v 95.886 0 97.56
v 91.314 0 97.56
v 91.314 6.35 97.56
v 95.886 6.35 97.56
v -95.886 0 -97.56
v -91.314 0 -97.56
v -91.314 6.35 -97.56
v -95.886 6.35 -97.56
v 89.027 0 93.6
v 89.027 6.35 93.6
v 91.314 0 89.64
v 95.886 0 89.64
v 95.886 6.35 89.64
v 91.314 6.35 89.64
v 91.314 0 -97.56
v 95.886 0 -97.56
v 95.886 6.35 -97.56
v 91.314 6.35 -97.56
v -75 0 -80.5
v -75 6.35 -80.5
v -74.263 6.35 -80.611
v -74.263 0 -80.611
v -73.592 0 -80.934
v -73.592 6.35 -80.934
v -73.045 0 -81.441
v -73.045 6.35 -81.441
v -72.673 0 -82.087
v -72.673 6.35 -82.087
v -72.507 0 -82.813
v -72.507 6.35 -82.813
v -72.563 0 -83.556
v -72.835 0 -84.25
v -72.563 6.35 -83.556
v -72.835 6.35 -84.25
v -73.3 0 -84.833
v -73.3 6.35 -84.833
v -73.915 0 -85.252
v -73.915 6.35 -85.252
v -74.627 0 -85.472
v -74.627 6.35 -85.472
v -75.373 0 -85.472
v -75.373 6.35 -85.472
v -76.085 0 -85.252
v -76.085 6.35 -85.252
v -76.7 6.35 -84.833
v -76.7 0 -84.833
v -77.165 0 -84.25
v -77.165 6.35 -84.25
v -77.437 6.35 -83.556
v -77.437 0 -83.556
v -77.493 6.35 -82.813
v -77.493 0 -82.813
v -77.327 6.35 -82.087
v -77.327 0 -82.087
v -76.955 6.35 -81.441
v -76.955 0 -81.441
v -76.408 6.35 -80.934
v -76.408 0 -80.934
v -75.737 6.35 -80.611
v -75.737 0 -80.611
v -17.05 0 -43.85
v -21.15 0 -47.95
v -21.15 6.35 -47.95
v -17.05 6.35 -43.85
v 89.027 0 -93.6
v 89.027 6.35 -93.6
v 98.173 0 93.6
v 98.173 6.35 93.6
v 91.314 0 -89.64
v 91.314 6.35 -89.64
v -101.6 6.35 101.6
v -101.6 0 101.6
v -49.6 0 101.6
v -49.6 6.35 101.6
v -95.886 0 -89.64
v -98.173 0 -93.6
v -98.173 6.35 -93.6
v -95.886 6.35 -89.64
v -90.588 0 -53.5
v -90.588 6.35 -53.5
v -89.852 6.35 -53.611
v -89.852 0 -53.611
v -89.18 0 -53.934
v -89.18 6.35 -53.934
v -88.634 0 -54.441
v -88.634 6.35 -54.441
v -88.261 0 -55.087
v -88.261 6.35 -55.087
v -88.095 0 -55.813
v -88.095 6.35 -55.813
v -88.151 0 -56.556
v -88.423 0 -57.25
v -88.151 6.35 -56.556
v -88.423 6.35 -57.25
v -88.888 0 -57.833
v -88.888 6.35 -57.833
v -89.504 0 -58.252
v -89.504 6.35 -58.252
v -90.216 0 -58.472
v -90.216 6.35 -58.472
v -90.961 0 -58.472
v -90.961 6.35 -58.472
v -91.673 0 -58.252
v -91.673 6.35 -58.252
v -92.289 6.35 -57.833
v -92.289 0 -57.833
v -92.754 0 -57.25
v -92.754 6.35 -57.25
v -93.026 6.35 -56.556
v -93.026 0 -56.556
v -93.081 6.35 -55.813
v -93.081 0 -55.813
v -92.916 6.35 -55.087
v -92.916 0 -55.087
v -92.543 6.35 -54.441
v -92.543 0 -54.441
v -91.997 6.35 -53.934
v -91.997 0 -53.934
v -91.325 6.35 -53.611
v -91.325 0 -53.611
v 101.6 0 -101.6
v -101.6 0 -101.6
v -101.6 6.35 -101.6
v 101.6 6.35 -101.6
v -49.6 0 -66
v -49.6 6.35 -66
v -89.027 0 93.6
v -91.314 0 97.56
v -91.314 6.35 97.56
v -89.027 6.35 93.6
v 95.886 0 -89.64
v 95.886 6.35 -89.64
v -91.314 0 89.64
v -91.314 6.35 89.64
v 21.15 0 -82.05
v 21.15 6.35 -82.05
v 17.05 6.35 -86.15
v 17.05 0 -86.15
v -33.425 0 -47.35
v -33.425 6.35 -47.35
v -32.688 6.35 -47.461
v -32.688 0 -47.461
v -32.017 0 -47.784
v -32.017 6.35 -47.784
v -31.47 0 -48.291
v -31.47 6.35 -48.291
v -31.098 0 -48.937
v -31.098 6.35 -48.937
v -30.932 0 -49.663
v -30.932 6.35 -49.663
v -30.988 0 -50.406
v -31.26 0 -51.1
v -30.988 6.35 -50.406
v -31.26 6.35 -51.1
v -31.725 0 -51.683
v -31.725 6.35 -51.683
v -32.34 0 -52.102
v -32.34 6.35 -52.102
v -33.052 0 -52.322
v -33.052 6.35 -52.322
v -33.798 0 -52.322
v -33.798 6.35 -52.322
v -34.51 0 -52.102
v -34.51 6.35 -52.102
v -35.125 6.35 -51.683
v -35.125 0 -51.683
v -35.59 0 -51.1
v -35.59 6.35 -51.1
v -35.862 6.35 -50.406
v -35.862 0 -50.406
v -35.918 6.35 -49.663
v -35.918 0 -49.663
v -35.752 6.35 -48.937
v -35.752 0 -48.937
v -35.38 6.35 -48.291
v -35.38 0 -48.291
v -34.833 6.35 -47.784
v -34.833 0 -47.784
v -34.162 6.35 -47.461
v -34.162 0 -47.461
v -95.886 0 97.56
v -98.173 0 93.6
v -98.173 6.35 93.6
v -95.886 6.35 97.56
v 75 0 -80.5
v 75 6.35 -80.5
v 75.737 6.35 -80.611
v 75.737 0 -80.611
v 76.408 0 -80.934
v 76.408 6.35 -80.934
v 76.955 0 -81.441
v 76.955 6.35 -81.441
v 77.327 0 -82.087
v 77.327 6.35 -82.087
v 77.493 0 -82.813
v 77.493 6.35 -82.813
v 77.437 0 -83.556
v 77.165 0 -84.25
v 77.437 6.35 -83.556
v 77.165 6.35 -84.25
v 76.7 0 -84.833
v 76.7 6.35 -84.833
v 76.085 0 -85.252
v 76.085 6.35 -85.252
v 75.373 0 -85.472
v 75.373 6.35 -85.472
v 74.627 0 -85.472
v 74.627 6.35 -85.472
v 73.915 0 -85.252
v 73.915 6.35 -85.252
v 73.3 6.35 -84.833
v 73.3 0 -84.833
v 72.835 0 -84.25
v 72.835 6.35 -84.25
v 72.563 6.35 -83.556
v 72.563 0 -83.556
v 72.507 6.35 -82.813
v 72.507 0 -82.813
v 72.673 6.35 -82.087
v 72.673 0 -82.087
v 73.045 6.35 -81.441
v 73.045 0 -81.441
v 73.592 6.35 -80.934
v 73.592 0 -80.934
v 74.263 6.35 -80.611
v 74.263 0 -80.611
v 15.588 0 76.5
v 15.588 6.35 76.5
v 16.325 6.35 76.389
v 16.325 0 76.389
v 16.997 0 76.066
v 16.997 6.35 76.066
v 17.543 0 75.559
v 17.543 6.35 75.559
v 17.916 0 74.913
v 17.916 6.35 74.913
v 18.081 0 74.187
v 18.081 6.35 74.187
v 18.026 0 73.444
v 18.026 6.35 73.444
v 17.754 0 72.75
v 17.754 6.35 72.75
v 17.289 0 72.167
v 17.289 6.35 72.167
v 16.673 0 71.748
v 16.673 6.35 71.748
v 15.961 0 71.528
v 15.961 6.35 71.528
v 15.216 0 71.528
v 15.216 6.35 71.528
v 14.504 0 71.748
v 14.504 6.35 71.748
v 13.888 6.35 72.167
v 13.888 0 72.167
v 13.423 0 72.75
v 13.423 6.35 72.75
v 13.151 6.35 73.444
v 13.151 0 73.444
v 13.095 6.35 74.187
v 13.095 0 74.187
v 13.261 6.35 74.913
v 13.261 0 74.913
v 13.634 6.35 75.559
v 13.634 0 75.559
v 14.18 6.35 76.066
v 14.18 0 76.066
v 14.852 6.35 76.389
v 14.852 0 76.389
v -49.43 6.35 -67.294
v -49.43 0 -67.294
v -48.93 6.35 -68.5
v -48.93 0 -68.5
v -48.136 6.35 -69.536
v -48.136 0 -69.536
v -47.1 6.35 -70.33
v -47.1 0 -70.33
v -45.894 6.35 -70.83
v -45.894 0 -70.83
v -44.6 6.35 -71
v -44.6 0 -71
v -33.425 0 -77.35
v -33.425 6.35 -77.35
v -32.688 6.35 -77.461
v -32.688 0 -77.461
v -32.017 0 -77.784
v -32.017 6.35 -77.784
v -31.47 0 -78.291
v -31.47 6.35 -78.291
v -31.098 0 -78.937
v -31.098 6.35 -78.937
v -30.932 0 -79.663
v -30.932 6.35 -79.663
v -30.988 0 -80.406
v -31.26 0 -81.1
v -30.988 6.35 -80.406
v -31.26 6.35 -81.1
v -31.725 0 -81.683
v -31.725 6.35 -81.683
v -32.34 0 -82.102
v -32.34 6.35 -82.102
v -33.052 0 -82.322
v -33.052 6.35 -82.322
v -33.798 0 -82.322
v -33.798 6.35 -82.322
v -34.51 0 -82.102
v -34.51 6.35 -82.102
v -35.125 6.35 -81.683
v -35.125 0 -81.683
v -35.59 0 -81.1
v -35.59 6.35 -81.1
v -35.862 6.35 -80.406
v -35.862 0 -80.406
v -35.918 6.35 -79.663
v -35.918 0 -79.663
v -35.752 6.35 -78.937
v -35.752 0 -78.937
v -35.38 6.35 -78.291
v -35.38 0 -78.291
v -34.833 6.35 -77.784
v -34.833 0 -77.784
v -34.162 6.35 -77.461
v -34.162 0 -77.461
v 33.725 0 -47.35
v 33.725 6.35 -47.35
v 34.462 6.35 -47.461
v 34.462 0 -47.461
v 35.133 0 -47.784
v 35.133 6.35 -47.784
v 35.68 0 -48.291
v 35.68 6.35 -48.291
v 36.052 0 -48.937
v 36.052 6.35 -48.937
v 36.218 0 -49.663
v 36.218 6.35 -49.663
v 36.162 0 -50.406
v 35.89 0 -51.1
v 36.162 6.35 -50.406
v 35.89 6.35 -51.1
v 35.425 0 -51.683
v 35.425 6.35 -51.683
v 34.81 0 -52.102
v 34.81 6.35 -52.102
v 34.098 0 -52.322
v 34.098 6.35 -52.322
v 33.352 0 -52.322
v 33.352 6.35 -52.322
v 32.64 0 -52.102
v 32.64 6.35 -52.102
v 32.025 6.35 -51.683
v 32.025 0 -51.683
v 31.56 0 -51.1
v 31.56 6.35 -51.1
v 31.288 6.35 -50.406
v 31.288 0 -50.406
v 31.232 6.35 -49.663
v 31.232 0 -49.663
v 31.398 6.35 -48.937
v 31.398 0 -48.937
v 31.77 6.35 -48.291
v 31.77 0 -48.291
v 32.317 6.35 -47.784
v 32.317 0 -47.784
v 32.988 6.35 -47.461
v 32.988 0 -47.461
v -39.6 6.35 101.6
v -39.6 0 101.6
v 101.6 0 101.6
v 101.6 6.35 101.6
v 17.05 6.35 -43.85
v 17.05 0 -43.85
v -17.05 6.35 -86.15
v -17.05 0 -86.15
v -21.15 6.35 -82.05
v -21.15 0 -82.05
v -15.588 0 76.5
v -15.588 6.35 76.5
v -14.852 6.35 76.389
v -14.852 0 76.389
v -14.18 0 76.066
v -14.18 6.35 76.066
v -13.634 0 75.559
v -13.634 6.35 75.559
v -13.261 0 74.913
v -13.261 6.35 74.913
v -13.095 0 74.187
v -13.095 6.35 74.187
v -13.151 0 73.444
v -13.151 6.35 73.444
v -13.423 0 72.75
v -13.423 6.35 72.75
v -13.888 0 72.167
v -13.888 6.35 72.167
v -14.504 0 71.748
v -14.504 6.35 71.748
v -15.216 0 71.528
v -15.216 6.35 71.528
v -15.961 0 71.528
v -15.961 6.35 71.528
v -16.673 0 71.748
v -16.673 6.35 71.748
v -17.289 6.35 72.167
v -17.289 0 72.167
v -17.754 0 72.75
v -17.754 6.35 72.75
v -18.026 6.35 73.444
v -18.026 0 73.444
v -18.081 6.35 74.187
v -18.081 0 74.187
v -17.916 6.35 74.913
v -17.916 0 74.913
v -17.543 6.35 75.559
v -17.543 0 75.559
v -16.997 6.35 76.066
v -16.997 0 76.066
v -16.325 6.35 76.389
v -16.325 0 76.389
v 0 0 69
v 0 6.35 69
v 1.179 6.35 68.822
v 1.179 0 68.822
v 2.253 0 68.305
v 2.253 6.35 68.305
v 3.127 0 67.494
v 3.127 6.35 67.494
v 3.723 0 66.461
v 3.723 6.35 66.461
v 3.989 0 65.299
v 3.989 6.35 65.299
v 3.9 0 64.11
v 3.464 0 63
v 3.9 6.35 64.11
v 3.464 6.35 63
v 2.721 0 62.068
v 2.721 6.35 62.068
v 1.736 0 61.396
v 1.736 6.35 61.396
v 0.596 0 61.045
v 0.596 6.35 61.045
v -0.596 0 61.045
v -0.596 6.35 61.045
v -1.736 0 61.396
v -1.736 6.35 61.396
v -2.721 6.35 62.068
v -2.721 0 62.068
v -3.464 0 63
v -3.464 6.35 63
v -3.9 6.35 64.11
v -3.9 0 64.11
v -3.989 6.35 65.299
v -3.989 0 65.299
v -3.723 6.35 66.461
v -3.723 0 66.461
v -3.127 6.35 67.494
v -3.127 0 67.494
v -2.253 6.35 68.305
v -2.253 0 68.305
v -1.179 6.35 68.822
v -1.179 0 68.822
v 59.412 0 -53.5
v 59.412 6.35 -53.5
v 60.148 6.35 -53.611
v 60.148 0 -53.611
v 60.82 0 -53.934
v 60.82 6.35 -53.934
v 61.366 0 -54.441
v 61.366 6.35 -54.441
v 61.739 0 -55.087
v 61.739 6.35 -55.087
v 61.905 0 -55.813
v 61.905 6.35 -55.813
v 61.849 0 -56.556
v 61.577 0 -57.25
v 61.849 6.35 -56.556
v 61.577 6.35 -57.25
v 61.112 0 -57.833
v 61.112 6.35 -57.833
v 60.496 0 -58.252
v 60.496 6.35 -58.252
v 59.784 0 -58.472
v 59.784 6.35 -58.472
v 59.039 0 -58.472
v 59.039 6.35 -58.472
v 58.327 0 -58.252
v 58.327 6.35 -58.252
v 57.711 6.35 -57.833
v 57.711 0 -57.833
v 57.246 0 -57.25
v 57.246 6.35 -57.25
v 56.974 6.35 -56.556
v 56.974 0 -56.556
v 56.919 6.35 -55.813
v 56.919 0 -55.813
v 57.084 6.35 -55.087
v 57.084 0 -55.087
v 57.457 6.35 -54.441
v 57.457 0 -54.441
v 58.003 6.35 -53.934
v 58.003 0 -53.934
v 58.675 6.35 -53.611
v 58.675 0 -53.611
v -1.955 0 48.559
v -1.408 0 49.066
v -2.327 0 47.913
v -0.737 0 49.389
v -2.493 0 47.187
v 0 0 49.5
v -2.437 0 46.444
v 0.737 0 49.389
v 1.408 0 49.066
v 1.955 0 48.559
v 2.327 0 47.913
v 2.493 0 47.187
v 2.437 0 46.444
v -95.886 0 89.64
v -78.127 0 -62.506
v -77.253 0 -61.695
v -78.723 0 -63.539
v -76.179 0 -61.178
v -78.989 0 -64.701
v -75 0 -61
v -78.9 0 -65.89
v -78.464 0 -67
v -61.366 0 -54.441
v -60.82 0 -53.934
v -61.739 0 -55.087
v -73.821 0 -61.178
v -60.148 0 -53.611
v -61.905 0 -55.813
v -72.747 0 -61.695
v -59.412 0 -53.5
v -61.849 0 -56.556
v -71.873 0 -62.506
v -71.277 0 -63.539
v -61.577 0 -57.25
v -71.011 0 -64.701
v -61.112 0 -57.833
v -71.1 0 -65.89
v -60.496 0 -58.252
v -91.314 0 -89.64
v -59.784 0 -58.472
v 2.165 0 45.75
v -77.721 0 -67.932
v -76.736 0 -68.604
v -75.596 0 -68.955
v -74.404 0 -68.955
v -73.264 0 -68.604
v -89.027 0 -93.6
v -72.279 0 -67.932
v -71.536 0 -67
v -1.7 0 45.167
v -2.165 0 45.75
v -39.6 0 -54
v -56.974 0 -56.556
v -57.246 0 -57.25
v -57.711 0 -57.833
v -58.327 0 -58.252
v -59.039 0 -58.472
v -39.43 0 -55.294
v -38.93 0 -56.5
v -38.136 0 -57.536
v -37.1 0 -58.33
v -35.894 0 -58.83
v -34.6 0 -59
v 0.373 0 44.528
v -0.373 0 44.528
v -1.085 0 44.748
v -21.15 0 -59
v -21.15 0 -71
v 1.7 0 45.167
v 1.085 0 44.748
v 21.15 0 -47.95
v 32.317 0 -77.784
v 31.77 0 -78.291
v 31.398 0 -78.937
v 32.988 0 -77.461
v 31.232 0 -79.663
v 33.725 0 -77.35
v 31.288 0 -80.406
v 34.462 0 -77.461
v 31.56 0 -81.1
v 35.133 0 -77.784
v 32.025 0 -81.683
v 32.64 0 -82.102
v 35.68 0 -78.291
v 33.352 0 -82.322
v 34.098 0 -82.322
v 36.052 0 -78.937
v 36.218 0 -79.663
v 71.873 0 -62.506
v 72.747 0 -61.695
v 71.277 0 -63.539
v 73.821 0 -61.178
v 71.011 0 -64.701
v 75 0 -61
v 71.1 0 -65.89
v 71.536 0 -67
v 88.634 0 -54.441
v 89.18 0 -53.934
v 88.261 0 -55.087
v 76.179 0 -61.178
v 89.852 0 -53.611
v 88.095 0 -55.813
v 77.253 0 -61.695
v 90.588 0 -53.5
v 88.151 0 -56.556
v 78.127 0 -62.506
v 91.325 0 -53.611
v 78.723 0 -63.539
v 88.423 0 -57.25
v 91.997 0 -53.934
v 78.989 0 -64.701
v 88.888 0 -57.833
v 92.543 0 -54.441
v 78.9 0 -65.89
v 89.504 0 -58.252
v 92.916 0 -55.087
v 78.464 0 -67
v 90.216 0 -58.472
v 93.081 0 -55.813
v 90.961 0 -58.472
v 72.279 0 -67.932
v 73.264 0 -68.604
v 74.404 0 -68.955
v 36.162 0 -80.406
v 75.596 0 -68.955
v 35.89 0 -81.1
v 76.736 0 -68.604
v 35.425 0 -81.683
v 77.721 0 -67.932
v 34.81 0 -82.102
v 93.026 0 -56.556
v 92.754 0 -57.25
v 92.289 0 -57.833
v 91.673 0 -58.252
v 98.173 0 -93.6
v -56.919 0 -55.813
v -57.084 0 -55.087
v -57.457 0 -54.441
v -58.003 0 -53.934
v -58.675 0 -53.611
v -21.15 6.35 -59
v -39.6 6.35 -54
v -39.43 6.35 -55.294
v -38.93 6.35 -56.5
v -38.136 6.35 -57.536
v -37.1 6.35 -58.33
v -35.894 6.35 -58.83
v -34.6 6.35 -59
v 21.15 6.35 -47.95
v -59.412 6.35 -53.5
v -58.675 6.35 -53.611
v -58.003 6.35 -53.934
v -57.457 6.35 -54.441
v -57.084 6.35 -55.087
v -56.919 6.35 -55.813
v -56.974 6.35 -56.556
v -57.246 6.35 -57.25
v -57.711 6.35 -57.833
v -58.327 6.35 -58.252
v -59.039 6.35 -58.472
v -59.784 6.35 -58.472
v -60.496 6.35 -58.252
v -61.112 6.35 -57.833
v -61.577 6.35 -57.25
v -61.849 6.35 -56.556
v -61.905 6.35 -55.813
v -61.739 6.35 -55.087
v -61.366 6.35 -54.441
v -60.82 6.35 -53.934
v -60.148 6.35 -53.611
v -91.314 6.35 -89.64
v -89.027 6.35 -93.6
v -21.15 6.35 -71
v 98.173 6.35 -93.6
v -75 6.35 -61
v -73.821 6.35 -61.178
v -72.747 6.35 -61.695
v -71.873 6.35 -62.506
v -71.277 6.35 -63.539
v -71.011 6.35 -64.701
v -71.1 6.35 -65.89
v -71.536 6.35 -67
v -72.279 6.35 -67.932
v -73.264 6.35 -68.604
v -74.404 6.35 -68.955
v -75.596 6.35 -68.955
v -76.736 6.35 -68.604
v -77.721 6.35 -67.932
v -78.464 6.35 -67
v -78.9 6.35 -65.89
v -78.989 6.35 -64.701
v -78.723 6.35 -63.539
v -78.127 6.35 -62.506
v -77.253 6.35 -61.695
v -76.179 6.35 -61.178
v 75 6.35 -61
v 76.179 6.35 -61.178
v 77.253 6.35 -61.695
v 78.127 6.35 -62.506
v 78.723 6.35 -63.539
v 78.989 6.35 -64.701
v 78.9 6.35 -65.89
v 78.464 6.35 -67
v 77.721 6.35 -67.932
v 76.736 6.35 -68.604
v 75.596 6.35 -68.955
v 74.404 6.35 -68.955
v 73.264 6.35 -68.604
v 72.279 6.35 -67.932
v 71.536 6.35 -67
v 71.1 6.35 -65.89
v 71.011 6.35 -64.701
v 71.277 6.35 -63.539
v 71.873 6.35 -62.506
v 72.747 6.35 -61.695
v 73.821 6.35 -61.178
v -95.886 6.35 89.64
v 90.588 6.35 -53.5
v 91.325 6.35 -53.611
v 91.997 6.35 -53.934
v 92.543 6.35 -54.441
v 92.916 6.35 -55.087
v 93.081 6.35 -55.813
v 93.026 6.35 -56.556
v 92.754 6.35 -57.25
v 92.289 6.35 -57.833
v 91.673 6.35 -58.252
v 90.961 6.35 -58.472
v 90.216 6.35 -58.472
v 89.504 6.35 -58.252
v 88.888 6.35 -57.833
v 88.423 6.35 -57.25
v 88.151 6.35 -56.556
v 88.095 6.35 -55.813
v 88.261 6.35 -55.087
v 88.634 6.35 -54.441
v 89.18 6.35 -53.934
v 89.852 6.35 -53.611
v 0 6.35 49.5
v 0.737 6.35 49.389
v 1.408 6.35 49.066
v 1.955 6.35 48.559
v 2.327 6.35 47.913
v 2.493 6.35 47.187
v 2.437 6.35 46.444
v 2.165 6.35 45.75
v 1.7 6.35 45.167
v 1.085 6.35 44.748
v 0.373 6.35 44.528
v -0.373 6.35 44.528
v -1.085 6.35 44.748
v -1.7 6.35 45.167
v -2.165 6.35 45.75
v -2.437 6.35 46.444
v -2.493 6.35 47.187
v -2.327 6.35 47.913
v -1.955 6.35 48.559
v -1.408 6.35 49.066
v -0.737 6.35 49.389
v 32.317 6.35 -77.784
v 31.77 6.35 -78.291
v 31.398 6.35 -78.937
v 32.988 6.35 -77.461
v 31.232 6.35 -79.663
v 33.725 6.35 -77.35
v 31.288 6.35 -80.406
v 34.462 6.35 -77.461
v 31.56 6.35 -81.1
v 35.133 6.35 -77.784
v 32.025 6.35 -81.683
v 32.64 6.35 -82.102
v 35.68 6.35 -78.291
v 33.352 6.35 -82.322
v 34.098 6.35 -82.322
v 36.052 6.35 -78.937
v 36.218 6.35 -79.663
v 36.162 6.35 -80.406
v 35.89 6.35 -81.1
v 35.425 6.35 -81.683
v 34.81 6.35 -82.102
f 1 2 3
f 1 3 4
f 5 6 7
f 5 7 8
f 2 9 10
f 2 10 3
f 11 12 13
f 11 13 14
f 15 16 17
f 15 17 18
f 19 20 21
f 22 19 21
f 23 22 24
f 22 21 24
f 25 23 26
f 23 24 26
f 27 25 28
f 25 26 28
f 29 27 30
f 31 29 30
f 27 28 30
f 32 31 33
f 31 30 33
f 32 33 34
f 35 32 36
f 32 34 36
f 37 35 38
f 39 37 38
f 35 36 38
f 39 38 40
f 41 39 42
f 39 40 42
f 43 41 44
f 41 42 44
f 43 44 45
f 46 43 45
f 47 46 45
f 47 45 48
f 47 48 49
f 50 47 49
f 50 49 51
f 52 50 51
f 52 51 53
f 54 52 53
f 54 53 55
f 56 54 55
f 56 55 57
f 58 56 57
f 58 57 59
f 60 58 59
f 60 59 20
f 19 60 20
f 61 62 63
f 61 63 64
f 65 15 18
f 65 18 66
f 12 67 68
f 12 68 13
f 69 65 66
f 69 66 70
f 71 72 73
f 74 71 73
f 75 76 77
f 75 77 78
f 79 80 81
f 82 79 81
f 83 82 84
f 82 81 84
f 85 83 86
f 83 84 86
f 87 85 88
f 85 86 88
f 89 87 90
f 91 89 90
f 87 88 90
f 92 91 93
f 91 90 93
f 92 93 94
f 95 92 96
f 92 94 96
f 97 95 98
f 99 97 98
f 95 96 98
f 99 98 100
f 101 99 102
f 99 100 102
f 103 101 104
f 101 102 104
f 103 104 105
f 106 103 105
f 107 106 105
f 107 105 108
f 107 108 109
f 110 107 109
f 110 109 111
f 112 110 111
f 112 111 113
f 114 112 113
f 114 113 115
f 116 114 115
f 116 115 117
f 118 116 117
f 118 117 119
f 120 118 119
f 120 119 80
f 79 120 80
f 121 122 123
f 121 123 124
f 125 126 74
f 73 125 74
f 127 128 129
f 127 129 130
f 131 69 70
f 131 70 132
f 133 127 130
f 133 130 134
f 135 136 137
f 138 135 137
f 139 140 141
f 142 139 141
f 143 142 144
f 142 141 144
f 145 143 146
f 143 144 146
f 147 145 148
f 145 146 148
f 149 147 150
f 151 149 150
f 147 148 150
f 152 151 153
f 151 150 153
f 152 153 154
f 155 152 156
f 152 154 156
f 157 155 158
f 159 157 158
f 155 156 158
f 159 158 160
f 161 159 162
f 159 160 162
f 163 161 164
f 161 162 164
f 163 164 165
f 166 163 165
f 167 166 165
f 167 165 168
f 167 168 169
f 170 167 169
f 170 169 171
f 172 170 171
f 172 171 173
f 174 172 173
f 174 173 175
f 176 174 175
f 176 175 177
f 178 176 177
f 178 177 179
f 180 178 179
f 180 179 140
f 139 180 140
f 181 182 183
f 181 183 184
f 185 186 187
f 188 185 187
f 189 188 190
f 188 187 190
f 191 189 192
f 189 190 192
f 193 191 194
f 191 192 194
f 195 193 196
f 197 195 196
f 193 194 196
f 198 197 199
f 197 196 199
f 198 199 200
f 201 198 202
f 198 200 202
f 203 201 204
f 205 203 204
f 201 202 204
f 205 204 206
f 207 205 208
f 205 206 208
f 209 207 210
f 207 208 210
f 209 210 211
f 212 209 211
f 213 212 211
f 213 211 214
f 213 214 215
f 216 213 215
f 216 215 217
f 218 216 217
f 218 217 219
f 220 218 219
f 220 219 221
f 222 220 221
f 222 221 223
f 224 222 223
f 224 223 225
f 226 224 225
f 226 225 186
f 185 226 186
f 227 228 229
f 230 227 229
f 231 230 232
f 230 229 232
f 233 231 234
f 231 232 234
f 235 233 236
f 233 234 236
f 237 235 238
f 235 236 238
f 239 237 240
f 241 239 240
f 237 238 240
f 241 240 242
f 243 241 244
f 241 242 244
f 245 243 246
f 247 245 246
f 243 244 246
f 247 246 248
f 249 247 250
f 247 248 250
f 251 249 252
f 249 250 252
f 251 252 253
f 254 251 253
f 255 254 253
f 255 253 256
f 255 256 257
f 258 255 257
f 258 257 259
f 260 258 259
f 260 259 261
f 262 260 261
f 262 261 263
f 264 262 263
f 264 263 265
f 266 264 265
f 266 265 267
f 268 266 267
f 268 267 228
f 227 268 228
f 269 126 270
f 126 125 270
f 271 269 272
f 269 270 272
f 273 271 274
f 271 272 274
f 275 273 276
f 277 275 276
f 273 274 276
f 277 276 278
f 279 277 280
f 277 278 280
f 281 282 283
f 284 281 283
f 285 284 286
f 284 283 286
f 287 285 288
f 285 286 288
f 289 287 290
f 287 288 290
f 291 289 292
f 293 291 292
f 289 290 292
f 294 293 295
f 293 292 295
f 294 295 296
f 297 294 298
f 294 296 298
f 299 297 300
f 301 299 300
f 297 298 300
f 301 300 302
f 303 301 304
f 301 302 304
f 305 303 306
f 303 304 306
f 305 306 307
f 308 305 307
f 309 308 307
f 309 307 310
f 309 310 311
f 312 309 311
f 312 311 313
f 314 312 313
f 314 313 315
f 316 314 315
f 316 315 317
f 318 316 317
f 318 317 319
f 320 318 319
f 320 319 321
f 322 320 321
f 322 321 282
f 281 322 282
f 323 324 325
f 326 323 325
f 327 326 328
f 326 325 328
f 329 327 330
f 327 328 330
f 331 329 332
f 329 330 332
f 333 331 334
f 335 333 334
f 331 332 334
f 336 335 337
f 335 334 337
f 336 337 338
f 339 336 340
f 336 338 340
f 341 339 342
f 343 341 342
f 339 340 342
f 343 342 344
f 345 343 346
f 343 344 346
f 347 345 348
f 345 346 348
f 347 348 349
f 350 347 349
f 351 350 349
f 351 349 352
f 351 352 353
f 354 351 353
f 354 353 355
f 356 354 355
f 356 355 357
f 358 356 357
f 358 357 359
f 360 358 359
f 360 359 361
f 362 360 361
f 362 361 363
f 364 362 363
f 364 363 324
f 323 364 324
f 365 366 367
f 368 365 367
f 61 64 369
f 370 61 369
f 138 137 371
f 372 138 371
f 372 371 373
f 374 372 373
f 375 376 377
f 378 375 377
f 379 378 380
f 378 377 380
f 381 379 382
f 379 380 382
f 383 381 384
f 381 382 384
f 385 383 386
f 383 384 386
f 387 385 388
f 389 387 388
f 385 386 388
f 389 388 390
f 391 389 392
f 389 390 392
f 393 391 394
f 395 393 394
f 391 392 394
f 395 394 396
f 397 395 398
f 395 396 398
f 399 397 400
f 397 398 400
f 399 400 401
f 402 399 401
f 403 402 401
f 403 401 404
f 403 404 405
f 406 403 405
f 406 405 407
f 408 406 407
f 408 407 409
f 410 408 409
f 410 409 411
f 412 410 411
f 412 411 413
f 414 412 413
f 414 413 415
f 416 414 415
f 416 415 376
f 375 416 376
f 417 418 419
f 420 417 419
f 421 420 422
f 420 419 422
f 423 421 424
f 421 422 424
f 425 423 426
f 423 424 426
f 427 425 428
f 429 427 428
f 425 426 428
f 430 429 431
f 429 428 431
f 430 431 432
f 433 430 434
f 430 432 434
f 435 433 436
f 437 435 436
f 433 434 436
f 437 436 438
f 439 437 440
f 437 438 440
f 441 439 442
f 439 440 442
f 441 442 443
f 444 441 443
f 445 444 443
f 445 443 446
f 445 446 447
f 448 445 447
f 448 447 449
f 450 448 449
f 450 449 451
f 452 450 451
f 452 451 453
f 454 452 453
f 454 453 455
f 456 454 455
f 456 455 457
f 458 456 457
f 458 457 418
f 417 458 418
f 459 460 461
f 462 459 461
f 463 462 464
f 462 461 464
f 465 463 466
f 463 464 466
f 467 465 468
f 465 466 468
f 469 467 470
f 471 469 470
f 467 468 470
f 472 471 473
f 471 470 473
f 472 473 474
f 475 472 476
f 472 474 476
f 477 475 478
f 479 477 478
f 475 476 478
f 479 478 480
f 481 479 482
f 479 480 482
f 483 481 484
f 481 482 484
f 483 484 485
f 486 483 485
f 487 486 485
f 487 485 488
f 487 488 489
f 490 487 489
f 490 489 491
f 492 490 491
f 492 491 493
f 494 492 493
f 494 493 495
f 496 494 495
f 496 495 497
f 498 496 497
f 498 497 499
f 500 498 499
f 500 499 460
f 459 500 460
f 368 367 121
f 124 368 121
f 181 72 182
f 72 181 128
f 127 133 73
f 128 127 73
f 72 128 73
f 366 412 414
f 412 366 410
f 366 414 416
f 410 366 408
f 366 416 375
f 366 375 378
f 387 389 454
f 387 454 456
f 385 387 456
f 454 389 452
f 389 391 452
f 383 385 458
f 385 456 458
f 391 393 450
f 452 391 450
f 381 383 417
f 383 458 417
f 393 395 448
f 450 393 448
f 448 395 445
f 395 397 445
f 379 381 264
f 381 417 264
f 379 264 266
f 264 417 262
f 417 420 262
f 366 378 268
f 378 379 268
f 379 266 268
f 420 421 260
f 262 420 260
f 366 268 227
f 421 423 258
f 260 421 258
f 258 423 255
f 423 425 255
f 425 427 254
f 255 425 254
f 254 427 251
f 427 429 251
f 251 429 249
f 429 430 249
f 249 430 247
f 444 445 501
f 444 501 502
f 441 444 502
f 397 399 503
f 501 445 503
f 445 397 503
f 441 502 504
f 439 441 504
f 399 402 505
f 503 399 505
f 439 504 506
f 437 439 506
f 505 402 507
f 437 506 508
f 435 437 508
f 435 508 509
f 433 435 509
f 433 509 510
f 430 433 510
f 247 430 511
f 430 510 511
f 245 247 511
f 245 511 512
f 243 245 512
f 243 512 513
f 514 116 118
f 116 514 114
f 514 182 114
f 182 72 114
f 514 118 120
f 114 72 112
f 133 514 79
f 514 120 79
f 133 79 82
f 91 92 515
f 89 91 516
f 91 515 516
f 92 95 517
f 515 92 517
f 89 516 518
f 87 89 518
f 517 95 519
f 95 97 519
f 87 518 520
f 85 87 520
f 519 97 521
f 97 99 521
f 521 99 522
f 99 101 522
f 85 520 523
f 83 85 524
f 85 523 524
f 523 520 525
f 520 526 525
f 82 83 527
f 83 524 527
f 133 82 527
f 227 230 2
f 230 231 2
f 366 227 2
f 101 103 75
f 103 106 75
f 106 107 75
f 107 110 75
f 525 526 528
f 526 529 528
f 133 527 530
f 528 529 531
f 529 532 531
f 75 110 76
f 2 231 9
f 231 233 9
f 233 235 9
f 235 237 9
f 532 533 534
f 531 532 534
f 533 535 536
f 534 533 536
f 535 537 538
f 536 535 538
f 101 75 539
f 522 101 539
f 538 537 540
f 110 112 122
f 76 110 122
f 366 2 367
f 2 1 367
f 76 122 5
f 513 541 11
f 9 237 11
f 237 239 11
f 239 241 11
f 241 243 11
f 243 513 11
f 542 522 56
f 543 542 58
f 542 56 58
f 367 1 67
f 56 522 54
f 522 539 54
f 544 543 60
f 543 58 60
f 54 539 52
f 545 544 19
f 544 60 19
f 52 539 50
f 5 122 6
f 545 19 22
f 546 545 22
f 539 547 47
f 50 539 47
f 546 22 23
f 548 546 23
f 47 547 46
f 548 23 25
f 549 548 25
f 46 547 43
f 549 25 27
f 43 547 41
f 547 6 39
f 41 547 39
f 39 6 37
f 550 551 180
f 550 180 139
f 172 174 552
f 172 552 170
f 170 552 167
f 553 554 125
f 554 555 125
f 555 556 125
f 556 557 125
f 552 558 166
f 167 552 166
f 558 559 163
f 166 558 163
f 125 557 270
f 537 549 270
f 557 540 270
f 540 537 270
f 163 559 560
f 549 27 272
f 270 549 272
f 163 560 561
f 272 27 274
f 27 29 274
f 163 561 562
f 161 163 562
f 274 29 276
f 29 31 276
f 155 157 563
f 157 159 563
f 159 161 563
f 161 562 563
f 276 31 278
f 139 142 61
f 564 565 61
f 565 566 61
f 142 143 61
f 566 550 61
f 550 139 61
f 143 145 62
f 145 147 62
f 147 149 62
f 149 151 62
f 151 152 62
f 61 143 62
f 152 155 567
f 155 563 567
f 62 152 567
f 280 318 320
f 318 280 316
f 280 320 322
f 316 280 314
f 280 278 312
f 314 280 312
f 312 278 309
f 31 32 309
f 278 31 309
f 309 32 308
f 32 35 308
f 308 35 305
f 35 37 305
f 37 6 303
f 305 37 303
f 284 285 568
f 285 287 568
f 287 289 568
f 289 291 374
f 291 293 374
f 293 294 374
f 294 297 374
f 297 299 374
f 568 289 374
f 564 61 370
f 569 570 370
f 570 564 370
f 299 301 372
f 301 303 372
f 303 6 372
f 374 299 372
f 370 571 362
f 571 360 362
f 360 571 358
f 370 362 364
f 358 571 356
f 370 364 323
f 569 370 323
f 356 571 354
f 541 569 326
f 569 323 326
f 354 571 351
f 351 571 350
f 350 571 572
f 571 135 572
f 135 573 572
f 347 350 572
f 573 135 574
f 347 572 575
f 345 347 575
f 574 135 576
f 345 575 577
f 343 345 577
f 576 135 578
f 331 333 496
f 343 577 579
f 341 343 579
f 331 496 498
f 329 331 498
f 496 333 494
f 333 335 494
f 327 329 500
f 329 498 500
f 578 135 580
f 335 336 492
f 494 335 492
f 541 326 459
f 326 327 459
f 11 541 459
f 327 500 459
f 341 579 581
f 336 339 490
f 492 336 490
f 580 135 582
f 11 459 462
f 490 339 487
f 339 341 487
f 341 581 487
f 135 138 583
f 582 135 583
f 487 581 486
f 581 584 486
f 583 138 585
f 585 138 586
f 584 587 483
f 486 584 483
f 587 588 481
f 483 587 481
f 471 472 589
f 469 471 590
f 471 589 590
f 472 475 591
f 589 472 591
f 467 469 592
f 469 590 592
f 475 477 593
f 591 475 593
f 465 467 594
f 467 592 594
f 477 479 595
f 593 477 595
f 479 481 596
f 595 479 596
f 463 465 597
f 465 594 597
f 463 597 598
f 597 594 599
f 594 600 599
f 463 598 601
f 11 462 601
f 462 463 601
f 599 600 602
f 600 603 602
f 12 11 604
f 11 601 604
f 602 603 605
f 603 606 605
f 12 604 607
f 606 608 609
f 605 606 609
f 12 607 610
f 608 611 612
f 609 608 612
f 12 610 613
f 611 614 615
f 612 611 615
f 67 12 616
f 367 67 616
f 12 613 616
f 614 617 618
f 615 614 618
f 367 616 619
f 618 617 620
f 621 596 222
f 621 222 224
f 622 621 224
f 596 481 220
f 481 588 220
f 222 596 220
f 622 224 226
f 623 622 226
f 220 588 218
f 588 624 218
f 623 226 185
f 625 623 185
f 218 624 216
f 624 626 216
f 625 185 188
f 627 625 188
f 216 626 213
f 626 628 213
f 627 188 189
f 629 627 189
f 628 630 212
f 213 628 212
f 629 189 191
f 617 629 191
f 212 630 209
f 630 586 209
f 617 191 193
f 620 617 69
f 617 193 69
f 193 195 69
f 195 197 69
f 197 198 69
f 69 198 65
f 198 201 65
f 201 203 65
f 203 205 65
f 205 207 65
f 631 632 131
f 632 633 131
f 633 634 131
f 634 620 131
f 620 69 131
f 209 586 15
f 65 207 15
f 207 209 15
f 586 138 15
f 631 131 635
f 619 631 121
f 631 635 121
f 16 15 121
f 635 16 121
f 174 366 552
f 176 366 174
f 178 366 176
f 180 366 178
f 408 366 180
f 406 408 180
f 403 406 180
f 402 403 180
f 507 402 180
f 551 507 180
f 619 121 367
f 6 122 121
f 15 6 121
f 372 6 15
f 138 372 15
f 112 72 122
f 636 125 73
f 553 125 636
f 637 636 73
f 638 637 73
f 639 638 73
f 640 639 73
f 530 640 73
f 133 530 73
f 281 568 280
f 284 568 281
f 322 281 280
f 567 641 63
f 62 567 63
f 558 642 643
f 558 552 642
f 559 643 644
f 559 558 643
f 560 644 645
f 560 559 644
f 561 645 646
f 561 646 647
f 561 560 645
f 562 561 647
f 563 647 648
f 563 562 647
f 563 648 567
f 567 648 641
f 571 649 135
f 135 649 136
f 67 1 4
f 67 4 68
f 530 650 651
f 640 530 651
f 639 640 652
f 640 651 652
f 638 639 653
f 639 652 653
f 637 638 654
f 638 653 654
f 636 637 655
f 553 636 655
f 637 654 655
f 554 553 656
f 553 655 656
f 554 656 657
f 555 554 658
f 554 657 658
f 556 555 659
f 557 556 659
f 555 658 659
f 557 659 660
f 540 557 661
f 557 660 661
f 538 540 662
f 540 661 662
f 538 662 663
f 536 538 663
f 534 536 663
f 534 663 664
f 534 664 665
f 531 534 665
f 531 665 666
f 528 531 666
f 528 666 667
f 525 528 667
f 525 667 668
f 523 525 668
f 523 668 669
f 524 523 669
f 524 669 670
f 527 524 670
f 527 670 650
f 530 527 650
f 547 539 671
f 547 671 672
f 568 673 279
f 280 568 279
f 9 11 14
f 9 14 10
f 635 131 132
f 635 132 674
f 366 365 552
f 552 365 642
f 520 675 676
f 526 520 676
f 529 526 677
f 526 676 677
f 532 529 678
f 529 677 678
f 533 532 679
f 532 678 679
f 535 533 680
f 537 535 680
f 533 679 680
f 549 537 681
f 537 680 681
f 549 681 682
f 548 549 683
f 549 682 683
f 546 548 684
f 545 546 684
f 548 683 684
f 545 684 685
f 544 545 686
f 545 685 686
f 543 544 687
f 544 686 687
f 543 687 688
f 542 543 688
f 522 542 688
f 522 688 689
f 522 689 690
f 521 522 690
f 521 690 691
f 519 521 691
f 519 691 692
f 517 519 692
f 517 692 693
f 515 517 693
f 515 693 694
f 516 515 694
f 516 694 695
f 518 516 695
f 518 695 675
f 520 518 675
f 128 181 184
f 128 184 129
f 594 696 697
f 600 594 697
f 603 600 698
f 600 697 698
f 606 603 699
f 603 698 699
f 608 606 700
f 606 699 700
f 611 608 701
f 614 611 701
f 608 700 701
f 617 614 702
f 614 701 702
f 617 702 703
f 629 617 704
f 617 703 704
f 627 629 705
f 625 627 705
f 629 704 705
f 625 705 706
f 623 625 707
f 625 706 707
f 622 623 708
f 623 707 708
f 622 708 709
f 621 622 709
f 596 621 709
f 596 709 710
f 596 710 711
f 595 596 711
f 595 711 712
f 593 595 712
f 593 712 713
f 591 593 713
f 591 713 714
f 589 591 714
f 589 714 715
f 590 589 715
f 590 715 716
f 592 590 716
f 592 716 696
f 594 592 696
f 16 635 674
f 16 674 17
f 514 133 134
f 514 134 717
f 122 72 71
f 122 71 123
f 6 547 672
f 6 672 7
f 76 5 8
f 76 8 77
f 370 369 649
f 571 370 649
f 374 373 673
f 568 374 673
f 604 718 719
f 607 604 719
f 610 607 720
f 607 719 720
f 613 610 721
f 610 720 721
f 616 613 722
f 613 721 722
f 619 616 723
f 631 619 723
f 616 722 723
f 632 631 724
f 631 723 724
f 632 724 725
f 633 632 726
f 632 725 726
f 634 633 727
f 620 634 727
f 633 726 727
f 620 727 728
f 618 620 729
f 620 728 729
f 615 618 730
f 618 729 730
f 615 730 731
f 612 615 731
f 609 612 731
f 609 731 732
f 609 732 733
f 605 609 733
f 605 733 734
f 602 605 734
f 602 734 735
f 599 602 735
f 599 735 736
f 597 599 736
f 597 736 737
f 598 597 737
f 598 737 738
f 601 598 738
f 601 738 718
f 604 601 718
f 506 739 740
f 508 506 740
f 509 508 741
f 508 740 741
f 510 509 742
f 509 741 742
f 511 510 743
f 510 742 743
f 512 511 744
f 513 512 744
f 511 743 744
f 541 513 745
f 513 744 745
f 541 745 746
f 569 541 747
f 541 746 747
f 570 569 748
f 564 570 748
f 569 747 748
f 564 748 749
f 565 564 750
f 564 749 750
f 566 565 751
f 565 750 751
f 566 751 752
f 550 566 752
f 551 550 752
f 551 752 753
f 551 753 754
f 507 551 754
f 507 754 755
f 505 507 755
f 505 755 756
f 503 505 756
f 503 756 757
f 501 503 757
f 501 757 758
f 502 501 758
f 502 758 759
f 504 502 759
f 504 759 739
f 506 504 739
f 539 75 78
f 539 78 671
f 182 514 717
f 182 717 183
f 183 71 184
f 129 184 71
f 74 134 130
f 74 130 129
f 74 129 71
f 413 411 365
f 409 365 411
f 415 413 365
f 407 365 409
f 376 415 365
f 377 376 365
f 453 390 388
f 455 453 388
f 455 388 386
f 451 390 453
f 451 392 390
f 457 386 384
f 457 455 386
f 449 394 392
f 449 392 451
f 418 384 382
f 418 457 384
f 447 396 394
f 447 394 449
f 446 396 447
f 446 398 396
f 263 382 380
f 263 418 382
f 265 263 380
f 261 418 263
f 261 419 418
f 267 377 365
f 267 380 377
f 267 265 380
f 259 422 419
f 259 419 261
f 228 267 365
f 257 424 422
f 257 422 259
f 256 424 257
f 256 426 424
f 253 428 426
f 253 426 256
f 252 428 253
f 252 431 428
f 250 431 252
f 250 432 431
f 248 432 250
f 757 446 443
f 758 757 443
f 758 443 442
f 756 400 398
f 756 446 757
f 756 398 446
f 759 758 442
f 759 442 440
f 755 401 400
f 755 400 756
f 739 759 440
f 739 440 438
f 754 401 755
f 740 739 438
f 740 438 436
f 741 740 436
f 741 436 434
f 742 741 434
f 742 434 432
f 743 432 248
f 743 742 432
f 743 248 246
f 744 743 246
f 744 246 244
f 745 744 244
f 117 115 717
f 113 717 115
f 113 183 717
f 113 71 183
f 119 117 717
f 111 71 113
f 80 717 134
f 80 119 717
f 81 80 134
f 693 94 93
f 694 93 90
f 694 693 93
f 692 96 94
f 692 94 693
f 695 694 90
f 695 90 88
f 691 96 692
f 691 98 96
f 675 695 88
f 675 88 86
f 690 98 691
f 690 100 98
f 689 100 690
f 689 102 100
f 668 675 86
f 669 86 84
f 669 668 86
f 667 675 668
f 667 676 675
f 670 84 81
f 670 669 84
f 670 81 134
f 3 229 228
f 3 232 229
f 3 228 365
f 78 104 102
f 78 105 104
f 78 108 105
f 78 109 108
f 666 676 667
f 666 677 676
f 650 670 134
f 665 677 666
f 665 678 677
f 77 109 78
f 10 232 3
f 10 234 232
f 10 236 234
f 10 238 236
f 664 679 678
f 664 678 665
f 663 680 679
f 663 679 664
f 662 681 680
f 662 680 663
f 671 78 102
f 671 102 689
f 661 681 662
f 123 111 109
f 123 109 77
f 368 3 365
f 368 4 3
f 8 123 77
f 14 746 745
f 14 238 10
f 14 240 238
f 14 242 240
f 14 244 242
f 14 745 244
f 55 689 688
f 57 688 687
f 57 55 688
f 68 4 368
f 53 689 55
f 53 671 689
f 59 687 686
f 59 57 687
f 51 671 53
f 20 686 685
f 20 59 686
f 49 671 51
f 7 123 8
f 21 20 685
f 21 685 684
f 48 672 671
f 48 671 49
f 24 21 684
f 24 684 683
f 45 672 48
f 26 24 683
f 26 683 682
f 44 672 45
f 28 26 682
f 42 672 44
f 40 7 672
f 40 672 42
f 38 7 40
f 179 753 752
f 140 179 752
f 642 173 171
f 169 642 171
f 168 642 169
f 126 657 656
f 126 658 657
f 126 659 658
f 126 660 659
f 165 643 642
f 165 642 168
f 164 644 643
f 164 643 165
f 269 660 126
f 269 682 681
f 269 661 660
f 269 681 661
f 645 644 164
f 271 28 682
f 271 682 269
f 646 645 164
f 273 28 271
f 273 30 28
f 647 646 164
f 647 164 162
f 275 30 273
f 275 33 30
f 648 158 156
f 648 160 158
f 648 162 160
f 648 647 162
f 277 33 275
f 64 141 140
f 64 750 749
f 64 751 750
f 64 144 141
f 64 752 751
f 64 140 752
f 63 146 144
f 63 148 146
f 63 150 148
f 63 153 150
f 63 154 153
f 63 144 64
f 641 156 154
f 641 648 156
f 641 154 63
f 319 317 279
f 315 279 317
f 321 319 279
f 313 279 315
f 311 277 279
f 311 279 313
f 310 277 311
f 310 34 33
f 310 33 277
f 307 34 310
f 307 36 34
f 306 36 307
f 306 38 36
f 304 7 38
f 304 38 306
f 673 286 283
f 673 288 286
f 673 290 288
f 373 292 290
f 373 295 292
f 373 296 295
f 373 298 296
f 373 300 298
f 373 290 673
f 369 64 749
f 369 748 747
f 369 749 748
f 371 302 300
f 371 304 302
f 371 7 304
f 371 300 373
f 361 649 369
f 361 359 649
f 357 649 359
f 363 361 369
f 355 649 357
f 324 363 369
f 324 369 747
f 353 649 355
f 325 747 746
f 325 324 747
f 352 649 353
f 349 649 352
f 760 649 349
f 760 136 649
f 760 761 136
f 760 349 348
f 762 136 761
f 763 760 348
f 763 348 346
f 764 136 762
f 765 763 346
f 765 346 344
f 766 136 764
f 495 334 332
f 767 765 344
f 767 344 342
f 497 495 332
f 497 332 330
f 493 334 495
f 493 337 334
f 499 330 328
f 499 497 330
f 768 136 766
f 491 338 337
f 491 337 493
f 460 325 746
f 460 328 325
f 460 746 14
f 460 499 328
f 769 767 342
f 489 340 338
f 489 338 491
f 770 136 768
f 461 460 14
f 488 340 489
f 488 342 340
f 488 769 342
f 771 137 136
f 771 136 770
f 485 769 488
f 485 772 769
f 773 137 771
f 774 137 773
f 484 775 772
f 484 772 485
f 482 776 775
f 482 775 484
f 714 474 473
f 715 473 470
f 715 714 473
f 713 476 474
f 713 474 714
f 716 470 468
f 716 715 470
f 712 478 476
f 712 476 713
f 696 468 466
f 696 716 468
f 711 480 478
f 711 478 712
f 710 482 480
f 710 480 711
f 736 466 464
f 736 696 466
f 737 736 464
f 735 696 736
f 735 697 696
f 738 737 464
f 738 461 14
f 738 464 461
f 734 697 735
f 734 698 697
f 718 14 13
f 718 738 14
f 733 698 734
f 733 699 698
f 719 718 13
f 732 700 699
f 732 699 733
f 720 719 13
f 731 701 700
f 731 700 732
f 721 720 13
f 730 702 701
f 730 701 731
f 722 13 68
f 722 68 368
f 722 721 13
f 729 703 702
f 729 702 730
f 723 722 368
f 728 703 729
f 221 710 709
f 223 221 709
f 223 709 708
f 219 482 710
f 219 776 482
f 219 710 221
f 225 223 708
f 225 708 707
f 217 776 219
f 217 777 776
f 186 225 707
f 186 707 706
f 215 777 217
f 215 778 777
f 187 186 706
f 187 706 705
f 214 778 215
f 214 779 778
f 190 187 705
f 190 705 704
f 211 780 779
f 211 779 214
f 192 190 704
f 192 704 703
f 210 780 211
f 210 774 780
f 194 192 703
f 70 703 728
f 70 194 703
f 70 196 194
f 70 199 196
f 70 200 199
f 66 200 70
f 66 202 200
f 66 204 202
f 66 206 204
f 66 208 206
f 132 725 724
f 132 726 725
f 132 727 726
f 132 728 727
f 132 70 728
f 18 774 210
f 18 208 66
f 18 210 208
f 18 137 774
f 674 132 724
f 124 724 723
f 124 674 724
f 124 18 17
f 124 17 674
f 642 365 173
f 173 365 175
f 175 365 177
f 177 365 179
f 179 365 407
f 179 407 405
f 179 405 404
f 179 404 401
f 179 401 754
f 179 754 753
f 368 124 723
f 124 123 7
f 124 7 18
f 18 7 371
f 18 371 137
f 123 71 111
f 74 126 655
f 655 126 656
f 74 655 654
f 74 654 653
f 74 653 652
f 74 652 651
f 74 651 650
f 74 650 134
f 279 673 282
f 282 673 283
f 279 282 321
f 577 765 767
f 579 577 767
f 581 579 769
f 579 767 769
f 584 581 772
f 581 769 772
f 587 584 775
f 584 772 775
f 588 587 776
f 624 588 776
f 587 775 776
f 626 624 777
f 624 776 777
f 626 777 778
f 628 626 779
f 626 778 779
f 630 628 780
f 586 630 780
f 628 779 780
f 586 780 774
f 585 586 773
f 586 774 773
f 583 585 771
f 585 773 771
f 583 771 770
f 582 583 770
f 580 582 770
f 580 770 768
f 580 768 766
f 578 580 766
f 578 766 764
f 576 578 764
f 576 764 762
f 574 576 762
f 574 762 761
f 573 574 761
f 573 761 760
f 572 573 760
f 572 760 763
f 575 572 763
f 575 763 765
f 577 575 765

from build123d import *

# Parameters (mm, degrees)
ESQUISSE1_W                  = 203.2
ESQUISSE1_H                  = 203.2
BOSS_EXTRU_1_DEPTH           = 6.35
ESQUISSE2_R                  = 4
ENL_V_MAT_EXTRU_1_DEPTH      = 144.824345992
ENL_V_MAT_EXTRU_2_DEPTH      = 144.824345992
ENL_V_MAT_EXTRU_3_DEPTH      = 144.824345992
CONG_1_R                     = 5
ESQUISSE5_R                  = 2.5
ENL_V_MAT_EXTRU_4_DEPTH      = 144.824345992
ESQUISSE6_R                  = 2.5
ENL_V_MAT_EXTRU_5_DEPTH      = 144.824345992
ENL_V_MAT_EXTRU_6_DEPTH      = 144.824345992
ENL_V_MAT_EXTRU_6_DEPTH_BACK = 144.824345992
ESQUISSE8_R                  = 2.5
ENL_V_MAT_EXTRU_7_DEPTH      = 144.824345992


with BuildPart() as part:
    # Esquisse1 → Boss.-Extru.1 (new body)
    with BuildSketch(Plane(origin=(0, 0, 0), x_dir=(1, 0, 0), z_dir=(0, 1, 0))):
        Rectangle(ESQUISSE1_W, ESQUISSE1_H)
    extrude(amount=BOSS_EXTRU_1_DEPTH)

    # Esquisse2 → Enlèv. mat.-Extru.1 (cut, through all)
    with BuildSketch(Plane(origin=(0, 6.35, 0), x_dir=(1, 0, 0), z_dir=(0, 1, 0))):
        with Locations((-75, 65)):
            Circle(ESQUISSE2_R)
        with Locations((75, 65)):
            Circle(ESQUISSE2_R)
        with Locations((0, -65)):
            Circle(ESQUISSE2_R)
    extrude(amount=-ENL_V_MAT_EXTRU_1_DEPTH, mode=Mode.SUBTRACT)

    # Esquisse3 → Enlèv. mat.-Extru.2 (cut, through all)
    with BuildSketch(Plane(origin=(0, 6.35, 0), x_dir=(1, 0, 0), z_dir=(0, 1, 0))):
        Polygon((-17.05, 86.15), (-21.15, 82.05), (-21.15, 47.95), (-17.05, 43.85), (17.05, 43.85), (21.15, 47.95), (21.15, 82.05), (17.05, 86.15), align=None)
    extrude(amount=-ENL_V_MAT_EXTRU_2_DEPTH, mode=Mode.SUBTRACT)

    # Esquisse4 → Enlèv. mat.-Extru.3 (cut, through all)
    with BuildSketch(Plane(origin=(0, 6.35, 0), x_dir=(1, 0, 0), z_dir=(0, 1, 0))):
        Polygon((-49.6, -101.6), (-39.6, -101.6), (-39.6, 59), (-21.15, 59), (-21.15, 71), (-49.6, 71), align=None)
    extrude(amount=-ENL_V_MAT_EXTRU_3_DEPTH, mode=Mode.SUBTRACT)

    # Congé1
    cong_1_edges = [part.edges().sort_by_distance(p)[0] for p in [
        (-49.6, 3.175, -71),
        (-39.6, 3.175, -59),
    ]]
    fillet(cong_1_edges, radius=CONG_1_R)

    # Esquisse5 → Enlèv. mat.-Extru.4 (cut, through all)
    with BuildSketch(Plane(origin=(0, 6.35, 0), x_dir=(1, 0, 0), z_dir=(0, 1, 0))):
        with Locations((-33.425, 49.85)):
            Circle(ESQUISSE5_R)
        with Locations((-33.425, 79.85)):
            Circle(ESQUISSE5_R)
        with Locations((33.725, 79.85)):
            Circle(ESQUISSE5_R)
        with Locations((33.725, 49.85)):
            Circle(ESQUISSE5_R)
    extrude(amount=-ENL_V_MAT_EXTRU_4_DEPTH, mode=Mode.SUBTRACT)

    # Esquisse6 → Enlèv. mat.-Extru.5 (cut, through all)
    with BuildSketch(Plane(origin=(0, 6.35, 0), x_dir=(1, 0, 0), z_dir=(0, 1, 0))):
        with Locations((93.6, -93.6)):
            Circle(ESQUISSE6_R)
        with Locations((-93.6, -93.6)):
            Circle(ESQUISSE6_R)
        with Locations((-93.6, 93.6)):
            Circle(ESQUISSE6_R)
        with Locations((93.6, 93.6)):
            Circle(ESQUISSE6_R)
    extrude(amount=-ENL_V_MAT_EXTRU_5_DEPTH, mode=Mode.SUBTRACT)

    # Esquisse7 → Enlèv. mat.-Extru.6 (cut, two sides: drawn at the far end of the back side and taken through both)
    with BuildSketch(Plane(origin=(0, 6.35, 0), x_dir=(1, 0, 0), z_dir=(0, 1, 0)).offset(-ENL_V_MAT_EXTRU_6_DEPTH_BACK)):
        Polygon((-98.172614132, -93.6), (-95.886307066, -97.56), (-91.313692934, -97.56), (-89.027385868, -93.6), (-91.313692934, -89.64), (-95.886307066, -89.64), align=None)
        Polygon((89.027385868, -93.6), (91.313692934, -97.56), (95.886307066, -97.56), (98.172614132, -93.6), (95.886307066, -89.64), (91.313692934, -89.64), align=None)
        Polygon((89.027385868, 93.6), (91.313692934, 89.64), (95.886307066, 89.64), (98.172614132, 93.6), (95.886307066, 97.56), (91.313692934, 97.56), align=None)
        Polygon((-98.172614132, 93.6), (-95.886307066, 89.64), (-91.313692934, 89.64), (-89.027385868, 93.6), (-91.313692934, 97.56), (-95.886307066, 97.56), align=None)
    extrude(amount=ENL_V_MAT_EXTRU_6_DEPTH + ENL_V_MAT_EXTRU_6_DEPTH_BACK, mode=Mode.SUBTRACT)

    # Esquisse8 → Enlèv. mat.-Extru.7 (cut, through all)
    with BuildSketch(Plane(origin=(0, 6.35, 0), x_dir=(1, 0, 0), z_dir=(0, 1, 0))):
        with Locations((90.588457268, 56)):
            Circle(ESQUISSE8_R)
        with Locations((59.411542732, 56)):
            Circle(ESQUISSE8_R)
        with Locations((75, 83)):
            Circle(ESQUISSE8_R)
        with Locations((-90.588457268, 56)):
            Circle(ESQUISSE8_R)
        with Locations((-75, 83)):
            Circle(ESQUISSE8_R)
        with Locations((-59.411542732, 56)):
            Circle(ESQUISSE8_R)
        with Locations((15.588457268, -74)):
            Circle(ESQUISSE8_R)
        with Locations((-15.588457268, -74)):
            Circle(ESQUISSE8_R)
        with Locations((0, -47)):
            Circle(ESQUISSE8_R)
    extrude(amount=-ENL_V_MAT_EXTRU_7_DEPTH, mode=Mode.SUBTRACT)


solid = part.part
